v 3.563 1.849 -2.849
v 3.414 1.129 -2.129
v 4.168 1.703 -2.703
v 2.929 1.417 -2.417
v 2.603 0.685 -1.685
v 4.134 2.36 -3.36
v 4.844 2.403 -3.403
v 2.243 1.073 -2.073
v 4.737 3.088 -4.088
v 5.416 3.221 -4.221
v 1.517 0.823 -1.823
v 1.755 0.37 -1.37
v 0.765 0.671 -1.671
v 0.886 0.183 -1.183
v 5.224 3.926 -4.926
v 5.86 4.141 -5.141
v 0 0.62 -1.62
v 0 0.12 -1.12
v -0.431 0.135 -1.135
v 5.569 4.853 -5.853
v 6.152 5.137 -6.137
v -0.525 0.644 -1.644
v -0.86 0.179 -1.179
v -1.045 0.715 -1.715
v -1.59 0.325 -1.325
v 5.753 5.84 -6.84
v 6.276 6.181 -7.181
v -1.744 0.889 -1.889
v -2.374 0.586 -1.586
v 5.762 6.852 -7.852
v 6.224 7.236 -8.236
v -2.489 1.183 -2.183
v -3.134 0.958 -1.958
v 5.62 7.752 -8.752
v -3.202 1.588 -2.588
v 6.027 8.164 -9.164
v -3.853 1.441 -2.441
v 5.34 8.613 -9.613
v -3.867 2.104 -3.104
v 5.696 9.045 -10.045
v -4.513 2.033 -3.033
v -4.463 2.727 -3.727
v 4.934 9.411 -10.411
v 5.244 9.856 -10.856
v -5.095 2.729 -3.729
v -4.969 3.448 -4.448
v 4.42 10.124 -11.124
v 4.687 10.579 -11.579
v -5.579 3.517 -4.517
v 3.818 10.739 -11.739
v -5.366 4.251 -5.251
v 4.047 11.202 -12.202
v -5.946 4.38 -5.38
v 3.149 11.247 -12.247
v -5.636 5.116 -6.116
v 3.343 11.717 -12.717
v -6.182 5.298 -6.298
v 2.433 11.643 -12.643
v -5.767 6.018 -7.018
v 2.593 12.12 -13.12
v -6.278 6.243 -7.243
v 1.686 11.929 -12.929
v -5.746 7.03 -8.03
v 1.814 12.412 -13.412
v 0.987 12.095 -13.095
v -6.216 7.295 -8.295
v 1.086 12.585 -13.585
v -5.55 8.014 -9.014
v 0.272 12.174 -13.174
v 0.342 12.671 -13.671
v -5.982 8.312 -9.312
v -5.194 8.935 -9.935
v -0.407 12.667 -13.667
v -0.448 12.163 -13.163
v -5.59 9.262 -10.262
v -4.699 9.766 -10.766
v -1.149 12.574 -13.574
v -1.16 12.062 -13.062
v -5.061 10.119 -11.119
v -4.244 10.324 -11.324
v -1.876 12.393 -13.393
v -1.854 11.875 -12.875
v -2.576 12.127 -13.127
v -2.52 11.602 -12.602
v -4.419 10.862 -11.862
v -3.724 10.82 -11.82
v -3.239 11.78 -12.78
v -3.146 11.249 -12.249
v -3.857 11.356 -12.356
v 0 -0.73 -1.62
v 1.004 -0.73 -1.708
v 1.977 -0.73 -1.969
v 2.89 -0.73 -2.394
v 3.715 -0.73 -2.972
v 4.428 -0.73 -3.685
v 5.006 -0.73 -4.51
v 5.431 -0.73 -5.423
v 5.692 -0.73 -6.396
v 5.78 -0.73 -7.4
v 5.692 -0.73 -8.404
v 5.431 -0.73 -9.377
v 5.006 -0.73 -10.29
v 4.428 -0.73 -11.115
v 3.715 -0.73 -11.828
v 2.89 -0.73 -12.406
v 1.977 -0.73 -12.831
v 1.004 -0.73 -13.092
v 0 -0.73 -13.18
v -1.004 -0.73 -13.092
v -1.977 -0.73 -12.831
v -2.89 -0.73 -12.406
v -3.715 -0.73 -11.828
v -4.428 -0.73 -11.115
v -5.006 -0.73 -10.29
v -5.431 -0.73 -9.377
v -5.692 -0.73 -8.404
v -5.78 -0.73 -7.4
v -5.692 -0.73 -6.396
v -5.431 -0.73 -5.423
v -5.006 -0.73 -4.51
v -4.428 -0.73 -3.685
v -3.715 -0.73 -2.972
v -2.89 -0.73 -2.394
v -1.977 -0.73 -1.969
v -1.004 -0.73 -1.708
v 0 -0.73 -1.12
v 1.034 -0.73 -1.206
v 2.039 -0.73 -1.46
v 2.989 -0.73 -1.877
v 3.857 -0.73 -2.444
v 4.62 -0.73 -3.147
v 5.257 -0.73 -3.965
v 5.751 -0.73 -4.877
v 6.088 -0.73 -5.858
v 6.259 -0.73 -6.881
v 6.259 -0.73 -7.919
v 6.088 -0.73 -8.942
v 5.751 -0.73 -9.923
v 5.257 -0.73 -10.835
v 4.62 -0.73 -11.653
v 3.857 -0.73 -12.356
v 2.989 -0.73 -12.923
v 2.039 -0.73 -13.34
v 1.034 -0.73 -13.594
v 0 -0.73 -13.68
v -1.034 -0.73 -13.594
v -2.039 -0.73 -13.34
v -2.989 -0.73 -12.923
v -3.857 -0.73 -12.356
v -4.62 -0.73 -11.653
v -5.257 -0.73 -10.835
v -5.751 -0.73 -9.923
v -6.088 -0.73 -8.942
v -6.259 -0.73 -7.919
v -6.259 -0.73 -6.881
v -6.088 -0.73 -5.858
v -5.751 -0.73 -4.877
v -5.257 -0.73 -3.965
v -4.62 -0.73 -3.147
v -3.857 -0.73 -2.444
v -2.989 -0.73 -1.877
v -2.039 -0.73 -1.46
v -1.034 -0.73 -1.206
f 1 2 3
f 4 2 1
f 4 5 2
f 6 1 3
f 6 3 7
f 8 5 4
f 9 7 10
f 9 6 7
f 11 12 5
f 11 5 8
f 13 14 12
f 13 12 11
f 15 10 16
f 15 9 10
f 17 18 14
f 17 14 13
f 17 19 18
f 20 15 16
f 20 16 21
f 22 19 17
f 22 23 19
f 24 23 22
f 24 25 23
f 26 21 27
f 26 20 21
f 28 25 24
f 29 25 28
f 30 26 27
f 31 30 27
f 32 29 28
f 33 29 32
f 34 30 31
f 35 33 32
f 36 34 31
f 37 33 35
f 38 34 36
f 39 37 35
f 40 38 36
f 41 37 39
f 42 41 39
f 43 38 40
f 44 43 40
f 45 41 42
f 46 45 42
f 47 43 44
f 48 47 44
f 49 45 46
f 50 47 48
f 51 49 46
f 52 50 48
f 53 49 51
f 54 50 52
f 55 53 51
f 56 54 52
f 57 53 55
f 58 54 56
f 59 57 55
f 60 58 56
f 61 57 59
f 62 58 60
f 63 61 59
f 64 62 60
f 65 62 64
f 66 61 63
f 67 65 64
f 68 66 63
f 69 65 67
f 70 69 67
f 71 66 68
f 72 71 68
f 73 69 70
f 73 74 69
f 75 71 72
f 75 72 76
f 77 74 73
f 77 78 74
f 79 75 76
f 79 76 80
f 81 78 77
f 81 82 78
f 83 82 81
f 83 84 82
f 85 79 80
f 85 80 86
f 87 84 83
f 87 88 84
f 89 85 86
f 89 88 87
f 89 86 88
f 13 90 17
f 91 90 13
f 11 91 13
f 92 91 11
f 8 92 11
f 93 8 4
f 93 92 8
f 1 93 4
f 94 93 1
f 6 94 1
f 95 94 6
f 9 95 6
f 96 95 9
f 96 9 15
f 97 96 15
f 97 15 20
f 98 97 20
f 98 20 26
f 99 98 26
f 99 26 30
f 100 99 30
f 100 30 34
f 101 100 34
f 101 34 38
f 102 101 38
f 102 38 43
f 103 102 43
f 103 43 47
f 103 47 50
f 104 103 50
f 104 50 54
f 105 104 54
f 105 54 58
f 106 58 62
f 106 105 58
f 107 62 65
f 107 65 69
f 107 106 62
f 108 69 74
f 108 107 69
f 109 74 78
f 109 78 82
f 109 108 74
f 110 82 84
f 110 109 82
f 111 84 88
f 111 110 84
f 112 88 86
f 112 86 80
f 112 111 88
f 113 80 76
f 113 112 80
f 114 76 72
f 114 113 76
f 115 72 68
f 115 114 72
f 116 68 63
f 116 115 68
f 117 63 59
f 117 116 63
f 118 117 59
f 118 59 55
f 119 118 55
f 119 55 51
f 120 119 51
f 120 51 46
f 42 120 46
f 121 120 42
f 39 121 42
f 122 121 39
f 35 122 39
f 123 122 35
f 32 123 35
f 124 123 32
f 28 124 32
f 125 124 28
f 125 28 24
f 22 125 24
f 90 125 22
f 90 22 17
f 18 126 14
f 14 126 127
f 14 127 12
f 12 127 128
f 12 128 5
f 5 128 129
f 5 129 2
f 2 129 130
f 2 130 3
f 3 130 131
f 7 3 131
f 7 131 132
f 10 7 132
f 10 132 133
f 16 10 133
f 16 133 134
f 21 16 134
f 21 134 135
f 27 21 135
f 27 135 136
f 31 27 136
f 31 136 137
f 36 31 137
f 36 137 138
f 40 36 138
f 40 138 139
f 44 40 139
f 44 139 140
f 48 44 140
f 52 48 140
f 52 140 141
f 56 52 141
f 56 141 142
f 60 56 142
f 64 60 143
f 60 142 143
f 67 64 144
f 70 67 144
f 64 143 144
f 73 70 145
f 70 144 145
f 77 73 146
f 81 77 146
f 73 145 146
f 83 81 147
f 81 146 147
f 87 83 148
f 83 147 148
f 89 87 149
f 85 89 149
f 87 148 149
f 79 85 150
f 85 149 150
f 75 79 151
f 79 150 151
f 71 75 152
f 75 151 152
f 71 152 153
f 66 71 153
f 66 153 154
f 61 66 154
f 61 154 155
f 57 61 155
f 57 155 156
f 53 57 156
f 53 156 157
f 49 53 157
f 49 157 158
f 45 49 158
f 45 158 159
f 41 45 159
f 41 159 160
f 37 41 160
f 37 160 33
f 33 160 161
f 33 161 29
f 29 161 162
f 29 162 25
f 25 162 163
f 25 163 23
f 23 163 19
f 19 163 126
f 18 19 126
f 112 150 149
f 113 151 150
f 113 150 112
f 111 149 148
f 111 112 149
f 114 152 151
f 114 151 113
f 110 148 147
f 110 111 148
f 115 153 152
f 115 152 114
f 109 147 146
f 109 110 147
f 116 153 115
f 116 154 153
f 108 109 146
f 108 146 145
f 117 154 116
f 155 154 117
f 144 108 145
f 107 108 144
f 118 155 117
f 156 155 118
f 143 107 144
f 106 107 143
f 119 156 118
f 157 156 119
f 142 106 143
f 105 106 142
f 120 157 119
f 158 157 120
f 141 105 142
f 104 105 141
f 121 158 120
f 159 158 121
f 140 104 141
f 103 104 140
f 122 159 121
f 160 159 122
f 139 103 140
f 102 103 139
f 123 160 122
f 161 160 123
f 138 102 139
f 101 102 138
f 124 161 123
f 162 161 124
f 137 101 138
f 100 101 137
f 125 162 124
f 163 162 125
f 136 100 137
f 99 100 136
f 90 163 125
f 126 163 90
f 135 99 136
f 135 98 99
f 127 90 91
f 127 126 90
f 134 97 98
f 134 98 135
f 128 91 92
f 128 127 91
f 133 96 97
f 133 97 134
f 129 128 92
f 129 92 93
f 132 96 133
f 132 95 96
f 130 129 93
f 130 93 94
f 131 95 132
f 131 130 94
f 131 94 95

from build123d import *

# Parameters (mm, degrees)
SKETCH2_R               = 20
BOSS_EXTRUDE1_DEPTH     = 0.707106781
SKETCH3_R               = 7.4
SKETCH3_R_2             = 5.9
BOSS_EXTRUDE2_DEPTH     = 1
CUT_EXTRUDE1_DEPTH      = 48.148112734
CUT_EXTRUDE1_DEPTH_BACK = 48.148112734
SKETCH4_W               = 305.220008054
SKETCH4_H               = 126.870977102
SKETCH4_R               = 6.4
BOSS_EXTRUDE3_REACH     = 25.052
SKETCH5_R               = 6.28
SKETCH5_R_2             = 5.78
SKETCH7_R               = 18.282703858
CUT_EXTRUDE3_DEPTH      = 0.707106781
SKETCH8_R               = 12.772794789
CUT_EXTRUDE4_DEPTH      = 2.52


with BuildPart() as part:
    # Sketch2 → Boss-Extrude1 (new body)
    with BuildSketch(Plane(origin=(0, 0, 0), x_dir=(1, 0, 0), z_dir=(0, 0.7071067811865464, 0.7071067811865488))):
        with Locations(Location((0, 20, 0), (0, 0, 270))):
            Circle(SKETCH2_R)
    extrude(amount=-BOSS_EXTRUDE1_DEPTH)

    # Sketch4 → Cut-Extrude1 (cut, two sides: drawn at the far end of the back side and taken through both)
    with BuildSketch(Plane.XZ.offset(3.25).offset(-CUT_EXTRUDE1_DEPTH_BACK)):
        with Locations((6.754756468, -15.87939177)):
            Rectangle(SKETCH4_W, SKETCH4_H)
        with Locations(Location((0, -7.4, 0), (0, 0, 90))):
            Circle(SKETCH4_R, mode=Mode.SUBTRACT)
    extrude(amount=CUT_EXTRUDE1_DEPTH + CUT_EXTRUDE1_DEPTH_BACK, mode=Mode.SUBTRACT)

    # Sketch7 → Cut-Extrude3 (cut)
    with BuildSketch(Plane(origin=(0, 0, 0), x_dir=(1, 0, 0), z_dir=(0, 0.7071067811865465, 0.7071067811865487))):
        with Locations((0, 10.465180362)):
            Circle(SKETCH7_R)
    extrude(amount=-CUT_EXTRUDE3_DEPTH, mode=Mode.SUBTRACT)


with BuildPart() as body_2:
    # Sketch3 → Boss-Extrude2 (new body)
    with BuildSketch(Plane(origin=(0, -3.25, 0), x_dir=(1, 0, 0), z_dir=(0, 1, 0))):
        with Locations(Location((0, 7.4, 0), (0, 0, 270))):
            Circle(SKETCH3_R)
        with Locations(Location((0, 7.4, 0), (0, 0, 270))):
            Circle(SKETCH3_R_2, mode=Mode.SUBTRACT)
    extrude(amount=BOSS_EXTRUDE2_DEPTH)


with BuildPart() as body_3:
    # Boss-Extrude3: up to this plane
    boss_extrude3_end = Plane(origin=(0, 13.642135624, -14.642135624), z_dir=(0, 0.7071067811865464, 0.7071067811865488))
    # Sketch5 → Boss-Extrude3 (new, up to the surface)
    with BuildSketch(Plane(origin=(0, -2.25, 0), x_dir=(1, 0, 0), z_dir=(0, 1, 0)), mode=Mode.PRIVATE) as boss_extrude3_sk1:
        with Locations(Location((0, 7.4, 0), (0, 0, 270))):
            Circle(SKETCH5_R)
        with Locations(Location((0, 7.4, 0), (0, 0, 270))):
            Circle(SKETCH5_R_2, mode=Mode.SUBTRACT)
    boss_extrude3_tool1 = split(extrude(boss_extrude3_sk1.sketch, amount=BOSS_EXTRUDE3_REACH, mode=Mode.PRIVATE), bisect_by=boss_extrude3_end, keep=Keep.BOTH, mode=Mode.PRIVATE)
    add(boss_extrude3_tool1.solids().sort_by_distance((0, -2.25, -13.502375))[0])


with BuildPart() as cut_extrude4_tool:
    # Sketch8 → Cut-Extrude4 (new body)
    with BuildSketch(Plane.XZ.offset(3.25)):
        with Locations((0, -7.395337102)):
            Circle(SKETCH8_R)
    extrude(amount=-CUT_EXTRUDE4_DEPTH)


with BuildPart() as body_2_1:
    add(body_2.part)

    # Cut-Extrude4: cut by cut_extrude4_tool
    add(cut_extrude4_tool.part, mode=Mode.SUBTRACT)


with BuildPart() as body_3_1:
    add(body_3.part)

    # Cut-Extrude4: cut by cut_extrude4_tool
    add(cut_extrude4_tool.part, mode=Mode.SUBTRACT)


solid = body_3_1.part
